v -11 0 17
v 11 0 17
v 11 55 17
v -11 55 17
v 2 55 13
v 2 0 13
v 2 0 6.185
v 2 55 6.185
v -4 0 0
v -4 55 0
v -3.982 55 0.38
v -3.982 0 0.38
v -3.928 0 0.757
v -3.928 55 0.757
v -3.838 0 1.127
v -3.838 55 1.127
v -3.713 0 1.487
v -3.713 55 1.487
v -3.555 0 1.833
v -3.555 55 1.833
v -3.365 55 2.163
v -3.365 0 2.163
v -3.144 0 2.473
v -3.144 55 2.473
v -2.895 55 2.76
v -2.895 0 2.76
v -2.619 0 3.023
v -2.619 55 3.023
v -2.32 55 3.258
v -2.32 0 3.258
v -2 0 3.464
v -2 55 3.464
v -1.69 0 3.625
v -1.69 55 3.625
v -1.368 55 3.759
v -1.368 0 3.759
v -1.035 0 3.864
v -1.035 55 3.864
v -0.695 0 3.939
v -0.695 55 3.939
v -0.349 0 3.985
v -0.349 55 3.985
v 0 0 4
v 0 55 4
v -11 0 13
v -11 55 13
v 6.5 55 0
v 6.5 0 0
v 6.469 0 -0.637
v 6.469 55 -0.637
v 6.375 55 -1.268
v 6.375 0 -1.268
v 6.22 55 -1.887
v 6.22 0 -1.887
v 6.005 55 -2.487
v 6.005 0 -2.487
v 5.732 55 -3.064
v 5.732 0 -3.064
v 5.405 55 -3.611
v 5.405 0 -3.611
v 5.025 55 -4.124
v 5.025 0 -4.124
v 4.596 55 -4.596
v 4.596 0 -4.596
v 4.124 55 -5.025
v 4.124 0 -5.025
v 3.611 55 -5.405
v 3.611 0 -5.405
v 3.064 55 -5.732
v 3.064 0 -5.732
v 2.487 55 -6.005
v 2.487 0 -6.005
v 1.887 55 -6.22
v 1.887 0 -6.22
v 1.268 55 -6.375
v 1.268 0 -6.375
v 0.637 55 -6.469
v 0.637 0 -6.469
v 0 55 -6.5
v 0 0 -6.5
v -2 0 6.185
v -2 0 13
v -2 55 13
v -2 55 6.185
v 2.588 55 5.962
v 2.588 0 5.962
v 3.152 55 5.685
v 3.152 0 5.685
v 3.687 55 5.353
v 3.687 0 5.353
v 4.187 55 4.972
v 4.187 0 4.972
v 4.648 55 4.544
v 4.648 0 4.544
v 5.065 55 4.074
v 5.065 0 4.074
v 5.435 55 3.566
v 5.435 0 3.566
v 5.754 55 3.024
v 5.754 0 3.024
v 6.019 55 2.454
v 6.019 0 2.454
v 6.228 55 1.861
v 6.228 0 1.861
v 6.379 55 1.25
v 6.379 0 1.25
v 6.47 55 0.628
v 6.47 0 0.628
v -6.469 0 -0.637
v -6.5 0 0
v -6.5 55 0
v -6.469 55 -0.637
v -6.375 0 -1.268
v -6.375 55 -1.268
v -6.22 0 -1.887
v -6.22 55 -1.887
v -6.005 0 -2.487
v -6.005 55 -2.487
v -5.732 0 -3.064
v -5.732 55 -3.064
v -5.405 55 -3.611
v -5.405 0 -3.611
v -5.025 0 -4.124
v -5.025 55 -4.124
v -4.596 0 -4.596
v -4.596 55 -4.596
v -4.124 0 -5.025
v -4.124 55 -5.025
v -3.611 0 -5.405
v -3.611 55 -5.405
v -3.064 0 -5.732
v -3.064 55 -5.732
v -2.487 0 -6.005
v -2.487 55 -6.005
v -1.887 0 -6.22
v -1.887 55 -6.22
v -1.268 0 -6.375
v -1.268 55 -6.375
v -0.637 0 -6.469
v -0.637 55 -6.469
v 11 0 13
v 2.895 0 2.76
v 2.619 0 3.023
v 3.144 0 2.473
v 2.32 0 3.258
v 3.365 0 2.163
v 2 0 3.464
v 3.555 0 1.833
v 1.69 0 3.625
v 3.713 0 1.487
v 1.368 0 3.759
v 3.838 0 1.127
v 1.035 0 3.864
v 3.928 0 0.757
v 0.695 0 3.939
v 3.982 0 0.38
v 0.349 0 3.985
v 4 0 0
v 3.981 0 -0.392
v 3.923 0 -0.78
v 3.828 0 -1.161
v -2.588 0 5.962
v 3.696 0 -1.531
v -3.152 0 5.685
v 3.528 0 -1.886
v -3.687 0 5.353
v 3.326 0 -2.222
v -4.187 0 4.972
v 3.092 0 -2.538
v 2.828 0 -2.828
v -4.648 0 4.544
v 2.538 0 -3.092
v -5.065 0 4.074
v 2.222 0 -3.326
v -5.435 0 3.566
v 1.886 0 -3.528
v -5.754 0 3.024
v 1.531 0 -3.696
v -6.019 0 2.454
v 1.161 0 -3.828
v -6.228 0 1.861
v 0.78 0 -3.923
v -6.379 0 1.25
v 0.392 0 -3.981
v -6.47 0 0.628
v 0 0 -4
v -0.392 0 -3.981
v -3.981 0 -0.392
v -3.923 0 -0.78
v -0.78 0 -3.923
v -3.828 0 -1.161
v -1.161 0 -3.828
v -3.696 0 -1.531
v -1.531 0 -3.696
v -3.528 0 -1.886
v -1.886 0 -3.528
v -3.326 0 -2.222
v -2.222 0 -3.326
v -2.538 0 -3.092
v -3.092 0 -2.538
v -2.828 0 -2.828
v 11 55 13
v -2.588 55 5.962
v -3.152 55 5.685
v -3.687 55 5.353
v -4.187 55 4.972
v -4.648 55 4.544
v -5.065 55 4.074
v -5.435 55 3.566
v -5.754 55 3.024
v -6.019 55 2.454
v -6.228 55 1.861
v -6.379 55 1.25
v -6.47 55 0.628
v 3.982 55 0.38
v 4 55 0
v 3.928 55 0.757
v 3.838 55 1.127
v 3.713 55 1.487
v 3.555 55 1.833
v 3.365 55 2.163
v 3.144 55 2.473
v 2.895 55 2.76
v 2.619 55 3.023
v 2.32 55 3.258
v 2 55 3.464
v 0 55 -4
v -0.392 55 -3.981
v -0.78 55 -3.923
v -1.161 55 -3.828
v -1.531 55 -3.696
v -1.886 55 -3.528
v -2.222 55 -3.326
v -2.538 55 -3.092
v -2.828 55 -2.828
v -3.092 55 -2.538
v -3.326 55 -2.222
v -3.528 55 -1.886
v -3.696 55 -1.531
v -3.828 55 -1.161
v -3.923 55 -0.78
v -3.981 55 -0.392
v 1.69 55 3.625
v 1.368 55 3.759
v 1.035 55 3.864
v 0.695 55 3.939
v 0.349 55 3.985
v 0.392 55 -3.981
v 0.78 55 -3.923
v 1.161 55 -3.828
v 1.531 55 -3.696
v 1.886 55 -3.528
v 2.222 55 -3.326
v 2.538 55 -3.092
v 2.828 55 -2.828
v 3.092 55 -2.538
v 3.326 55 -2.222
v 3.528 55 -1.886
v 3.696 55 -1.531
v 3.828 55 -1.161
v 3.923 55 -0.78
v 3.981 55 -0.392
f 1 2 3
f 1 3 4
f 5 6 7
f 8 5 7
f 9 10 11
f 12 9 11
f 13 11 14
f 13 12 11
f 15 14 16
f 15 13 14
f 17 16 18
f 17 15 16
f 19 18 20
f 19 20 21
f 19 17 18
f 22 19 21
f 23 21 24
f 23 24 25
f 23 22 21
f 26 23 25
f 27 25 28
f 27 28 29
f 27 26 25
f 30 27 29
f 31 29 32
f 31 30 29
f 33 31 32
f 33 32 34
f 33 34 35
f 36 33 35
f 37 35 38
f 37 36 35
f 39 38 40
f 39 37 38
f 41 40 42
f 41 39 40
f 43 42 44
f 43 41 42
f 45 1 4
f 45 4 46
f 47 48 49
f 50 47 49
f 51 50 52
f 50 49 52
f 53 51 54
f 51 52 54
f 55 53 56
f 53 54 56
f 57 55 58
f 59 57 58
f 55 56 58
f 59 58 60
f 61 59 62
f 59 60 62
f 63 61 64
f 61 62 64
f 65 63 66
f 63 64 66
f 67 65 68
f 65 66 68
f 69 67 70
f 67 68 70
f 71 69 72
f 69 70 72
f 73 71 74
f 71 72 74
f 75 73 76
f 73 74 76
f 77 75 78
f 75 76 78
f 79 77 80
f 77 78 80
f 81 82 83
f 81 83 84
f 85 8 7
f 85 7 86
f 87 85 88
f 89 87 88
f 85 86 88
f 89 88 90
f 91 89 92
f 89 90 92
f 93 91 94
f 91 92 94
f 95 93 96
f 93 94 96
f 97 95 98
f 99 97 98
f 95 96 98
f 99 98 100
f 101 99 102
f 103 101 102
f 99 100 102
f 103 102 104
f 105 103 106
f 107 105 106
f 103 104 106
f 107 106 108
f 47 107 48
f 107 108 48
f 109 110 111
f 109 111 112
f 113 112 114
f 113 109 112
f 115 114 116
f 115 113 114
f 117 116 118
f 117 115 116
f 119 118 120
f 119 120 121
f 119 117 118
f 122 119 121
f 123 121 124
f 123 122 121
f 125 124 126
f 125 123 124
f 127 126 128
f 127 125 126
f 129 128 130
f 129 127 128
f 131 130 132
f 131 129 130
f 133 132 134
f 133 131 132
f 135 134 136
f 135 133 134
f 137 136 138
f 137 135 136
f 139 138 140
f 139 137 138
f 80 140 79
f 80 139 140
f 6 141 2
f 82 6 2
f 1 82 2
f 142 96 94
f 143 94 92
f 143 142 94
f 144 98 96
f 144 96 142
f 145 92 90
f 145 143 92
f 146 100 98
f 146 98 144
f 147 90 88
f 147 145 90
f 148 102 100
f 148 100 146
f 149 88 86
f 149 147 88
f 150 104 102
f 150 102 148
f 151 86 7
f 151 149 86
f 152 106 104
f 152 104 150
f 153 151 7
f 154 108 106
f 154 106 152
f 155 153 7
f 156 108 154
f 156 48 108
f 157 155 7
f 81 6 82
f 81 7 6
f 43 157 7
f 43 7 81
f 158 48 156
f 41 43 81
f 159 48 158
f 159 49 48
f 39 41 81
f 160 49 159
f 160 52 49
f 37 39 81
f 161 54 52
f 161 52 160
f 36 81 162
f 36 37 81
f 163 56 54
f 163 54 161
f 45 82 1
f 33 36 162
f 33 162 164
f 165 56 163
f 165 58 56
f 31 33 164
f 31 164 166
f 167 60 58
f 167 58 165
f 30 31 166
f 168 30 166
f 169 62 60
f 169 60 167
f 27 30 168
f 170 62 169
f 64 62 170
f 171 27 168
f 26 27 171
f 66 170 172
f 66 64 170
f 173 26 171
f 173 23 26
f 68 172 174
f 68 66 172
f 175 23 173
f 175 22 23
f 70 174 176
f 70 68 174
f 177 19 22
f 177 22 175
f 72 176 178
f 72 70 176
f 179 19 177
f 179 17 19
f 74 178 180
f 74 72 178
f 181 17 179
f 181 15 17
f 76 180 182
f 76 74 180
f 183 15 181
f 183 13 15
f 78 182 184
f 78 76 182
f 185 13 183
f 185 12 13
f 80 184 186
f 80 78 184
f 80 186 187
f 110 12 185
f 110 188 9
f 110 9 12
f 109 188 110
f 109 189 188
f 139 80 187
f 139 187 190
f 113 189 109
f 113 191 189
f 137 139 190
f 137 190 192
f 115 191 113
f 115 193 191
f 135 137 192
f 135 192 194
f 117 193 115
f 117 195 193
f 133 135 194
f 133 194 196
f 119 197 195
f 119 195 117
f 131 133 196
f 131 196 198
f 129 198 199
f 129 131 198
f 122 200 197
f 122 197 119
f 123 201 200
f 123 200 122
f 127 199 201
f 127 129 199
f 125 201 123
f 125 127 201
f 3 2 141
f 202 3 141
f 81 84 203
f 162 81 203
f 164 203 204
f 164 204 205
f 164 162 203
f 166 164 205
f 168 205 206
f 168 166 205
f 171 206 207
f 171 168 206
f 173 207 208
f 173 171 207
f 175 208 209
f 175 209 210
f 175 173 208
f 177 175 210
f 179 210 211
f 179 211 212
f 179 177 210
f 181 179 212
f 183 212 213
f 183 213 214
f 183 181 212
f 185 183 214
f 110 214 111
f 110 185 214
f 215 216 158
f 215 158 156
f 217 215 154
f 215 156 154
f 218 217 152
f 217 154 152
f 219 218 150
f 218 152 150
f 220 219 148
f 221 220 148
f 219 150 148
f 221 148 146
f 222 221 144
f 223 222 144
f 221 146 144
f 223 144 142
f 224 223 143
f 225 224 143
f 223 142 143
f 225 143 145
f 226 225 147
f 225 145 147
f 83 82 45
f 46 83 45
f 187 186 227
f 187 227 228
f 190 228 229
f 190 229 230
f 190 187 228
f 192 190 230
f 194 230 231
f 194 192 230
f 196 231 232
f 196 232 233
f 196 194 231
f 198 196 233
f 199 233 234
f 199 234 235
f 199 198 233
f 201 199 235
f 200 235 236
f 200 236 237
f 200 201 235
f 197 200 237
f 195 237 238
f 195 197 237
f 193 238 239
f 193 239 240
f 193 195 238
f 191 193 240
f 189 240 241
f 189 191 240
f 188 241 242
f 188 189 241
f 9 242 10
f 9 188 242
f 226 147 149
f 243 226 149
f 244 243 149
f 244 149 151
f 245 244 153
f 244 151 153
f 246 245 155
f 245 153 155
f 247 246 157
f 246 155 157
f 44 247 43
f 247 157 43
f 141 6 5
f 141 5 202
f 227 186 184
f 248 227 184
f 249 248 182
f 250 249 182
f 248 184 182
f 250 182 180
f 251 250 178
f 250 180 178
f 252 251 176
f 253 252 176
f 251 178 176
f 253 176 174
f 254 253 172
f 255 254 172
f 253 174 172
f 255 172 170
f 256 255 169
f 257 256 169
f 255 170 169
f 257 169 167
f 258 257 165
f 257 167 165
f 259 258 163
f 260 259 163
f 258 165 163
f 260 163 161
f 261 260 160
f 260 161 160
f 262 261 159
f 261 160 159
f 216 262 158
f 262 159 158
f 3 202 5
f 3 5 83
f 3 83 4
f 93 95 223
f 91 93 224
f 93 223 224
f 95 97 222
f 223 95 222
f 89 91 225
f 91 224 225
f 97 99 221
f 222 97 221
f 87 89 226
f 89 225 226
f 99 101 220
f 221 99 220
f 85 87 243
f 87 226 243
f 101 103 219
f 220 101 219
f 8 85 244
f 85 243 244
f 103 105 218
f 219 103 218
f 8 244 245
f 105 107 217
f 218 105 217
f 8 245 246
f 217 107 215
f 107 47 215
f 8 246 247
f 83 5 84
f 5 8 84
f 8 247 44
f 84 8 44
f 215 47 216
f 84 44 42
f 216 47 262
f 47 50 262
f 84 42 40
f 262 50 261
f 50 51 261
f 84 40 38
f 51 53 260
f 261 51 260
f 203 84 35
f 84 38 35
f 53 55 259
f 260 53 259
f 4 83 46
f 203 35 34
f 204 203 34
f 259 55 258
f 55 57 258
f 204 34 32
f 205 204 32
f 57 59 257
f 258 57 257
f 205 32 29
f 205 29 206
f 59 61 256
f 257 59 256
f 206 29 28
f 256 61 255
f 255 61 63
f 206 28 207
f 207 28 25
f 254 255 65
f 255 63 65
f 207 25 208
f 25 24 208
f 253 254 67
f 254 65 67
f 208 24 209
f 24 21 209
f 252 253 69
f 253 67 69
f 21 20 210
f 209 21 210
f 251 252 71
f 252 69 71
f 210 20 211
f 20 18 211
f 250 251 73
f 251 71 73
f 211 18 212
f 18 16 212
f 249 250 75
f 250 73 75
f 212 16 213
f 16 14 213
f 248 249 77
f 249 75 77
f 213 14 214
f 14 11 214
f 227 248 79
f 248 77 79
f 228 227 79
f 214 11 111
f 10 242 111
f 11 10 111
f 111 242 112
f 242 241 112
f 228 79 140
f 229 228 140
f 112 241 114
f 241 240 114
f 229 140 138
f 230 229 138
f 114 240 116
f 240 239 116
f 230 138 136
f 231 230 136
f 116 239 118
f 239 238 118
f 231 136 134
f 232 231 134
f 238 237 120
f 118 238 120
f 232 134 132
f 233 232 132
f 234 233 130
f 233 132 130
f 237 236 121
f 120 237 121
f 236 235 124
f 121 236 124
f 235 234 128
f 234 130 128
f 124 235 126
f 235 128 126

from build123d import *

# Parameters (mm, degrees)
SKETCH_1_W      = 9
SKETCH_1_H      = 4
EXTRUDE_1_DEPTH = 55


with BuildPart() as part:
    # Эскиз1 → Бобышка-Вытянуть1 (new body)
    with BuildSketch(Plane(origin=(0, 0, 0), x_dir=(1, 0, 0), z_dir=(0, 1, 0))):
        with BuildLine():
            ThreePointArc((6.5, 0), (4.596194078, 4.596194078), (0, 6.5))
            Line((0, 6.5), (0, 4))
            ThreePointArc((0, 4), (2.828427125, 2.828427125), (4, 0))
            ThreePointArc((4, 0), (3.464101615, -2), (2, -3.464101615))
            Line((2, -3.464101615), (2, -6.184658438))
            ThreePointArc((2, -6.184658438), (5.25594901, -3.824264635), (6.5, 0))
        make_face()
        with BuildLine():
            Line((0, -4), (0, -6.5))
            ThreePointArc((0, -6.5), (1.01235373, -6.420680643), (2, -6.184658438))
            Line((2, -6.184658438), (2, -3.464101615))
            ThreePointArc((2, -3.464101615), (1.03527618, -3.863703305), (0, -4))
        make_face()
        with BuildLine():
            ThreePointArc((2, -6.184658438), (1.01235373, -6.420680643), (0, -6.5))
            Line((0, -6.5), (0, -17))
            Line((0, -17), (2, -17))
            Line((2, -17), (2, -13))
            Line((2, -13), (2, -6.184658438))
        make_face()
        with Locations((6.5, -15)):
            Rectangle(SKETCH_1_W, SKETCH_1_H)
    extrude(amount=EXTRUDE_1_DEPTH)

    # Зеркальное отражение1: part across plane


with BuildPart() as part_1:
    add(part.part)
    add(part.part.mirror(Plane(origin=(0, 55, 0), x_dir=(0, 0, 1), z_dir=(1, 0, 0))))


solid = part_1.part
